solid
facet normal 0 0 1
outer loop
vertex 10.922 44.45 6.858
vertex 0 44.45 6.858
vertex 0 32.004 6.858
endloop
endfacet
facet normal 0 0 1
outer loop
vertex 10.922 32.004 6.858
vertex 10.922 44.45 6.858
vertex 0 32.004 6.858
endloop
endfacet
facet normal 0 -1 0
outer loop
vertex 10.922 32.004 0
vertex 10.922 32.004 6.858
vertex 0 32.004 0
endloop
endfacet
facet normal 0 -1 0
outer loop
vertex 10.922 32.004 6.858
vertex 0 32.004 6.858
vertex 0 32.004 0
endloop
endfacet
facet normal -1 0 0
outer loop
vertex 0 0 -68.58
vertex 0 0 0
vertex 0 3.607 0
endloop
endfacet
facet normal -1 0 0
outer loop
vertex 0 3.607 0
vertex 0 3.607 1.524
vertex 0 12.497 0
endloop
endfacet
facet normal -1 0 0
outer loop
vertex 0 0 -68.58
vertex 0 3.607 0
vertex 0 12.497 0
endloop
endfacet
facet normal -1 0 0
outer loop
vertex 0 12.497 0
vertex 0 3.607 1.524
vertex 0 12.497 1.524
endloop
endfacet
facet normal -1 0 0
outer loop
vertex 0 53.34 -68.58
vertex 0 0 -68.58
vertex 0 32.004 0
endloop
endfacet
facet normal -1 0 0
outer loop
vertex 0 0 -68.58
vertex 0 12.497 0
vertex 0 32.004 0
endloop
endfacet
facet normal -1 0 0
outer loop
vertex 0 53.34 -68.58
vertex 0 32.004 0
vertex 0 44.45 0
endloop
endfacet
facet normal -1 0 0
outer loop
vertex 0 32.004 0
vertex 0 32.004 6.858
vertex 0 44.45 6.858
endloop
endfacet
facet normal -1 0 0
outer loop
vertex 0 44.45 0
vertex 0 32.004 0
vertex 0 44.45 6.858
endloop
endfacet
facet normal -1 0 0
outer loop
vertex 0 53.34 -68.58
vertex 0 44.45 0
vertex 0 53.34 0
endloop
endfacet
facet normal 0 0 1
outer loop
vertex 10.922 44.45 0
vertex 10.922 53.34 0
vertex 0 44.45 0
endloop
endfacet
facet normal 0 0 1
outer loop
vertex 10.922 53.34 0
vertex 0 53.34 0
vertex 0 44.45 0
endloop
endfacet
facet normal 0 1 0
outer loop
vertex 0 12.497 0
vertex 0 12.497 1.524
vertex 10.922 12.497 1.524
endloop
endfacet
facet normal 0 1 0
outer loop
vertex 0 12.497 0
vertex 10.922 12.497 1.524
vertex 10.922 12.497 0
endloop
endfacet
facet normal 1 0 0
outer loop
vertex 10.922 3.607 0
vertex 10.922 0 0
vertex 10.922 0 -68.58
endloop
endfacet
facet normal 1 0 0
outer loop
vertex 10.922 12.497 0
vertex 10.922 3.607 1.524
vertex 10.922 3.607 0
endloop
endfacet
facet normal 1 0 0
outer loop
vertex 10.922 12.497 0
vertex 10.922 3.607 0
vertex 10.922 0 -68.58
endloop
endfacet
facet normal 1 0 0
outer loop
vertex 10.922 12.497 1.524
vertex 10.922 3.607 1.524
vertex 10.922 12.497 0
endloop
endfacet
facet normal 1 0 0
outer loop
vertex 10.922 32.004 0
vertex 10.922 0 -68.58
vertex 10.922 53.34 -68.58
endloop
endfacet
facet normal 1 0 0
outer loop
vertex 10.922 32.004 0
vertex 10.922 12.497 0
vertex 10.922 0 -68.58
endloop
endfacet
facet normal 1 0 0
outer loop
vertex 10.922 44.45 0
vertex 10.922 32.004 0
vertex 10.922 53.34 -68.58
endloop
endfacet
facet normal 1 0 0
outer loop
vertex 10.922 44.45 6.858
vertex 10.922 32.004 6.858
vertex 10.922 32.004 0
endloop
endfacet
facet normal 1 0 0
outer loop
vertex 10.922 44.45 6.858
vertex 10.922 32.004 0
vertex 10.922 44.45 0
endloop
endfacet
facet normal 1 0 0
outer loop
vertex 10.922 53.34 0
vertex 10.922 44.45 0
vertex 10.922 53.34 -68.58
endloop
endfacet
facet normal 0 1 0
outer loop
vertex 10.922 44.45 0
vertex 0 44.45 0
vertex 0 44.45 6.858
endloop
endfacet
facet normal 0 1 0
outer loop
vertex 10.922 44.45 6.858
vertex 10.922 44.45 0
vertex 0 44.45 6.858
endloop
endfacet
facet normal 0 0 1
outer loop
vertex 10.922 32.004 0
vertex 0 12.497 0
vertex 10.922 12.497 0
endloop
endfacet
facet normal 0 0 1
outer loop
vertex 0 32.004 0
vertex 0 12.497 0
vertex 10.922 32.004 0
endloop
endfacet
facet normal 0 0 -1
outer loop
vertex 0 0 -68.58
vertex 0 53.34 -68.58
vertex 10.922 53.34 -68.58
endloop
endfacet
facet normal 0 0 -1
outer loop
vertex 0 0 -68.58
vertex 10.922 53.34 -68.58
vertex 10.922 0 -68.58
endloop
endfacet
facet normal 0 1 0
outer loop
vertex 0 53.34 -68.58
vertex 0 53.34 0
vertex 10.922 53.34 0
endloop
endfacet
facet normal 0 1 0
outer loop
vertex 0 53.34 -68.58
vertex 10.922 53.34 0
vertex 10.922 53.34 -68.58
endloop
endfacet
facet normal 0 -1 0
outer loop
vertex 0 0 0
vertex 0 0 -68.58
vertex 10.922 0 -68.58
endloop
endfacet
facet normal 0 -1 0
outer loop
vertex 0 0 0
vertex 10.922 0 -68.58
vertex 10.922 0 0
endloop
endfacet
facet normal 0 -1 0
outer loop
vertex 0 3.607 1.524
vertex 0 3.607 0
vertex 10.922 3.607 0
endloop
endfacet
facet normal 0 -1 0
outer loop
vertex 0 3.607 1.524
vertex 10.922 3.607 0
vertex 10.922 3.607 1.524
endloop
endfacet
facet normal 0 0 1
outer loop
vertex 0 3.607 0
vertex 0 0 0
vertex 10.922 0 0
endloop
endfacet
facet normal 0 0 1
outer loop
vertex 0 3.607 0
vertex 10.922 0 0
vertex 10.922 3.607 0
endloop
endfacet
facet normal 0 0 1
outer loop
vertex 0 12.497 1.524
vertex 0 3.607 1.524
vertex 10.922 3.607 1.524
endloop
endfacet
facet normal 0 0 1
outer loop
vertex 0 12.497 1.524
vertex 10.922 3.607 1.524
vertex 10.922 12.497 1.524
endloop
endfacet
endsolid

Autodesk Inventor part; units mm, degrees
ref_plane "YZ Plane" through (0, 0, 0) normal (1, 0, 0) x (0, 1, 0)
ref_plane "XZ Plane" through (0, 0, 0) normal (0, 1, 0) x (-1, 0, 0)
ref_plane "XY Plane" through (0, 0, 0) normal (0, 0, 1) x (1, 0, 0)
sketch "Sketch1" plane through (0, 0, 0) normal (1, 0, 0) x (0, 1, 0)
  line L0 (53.34, 0) -> (53.34, -68.58)
  line L1 (53.34, -68.58) -> (0, -68.58)
  line L2 (0, -68.58) -> (0, 0)
  line L3 (53.34, 0) -> (44.45, 0)
  line L4 (44.45, 0) -> (44.45, 6.858)
  line L5 (44.45, 6.858) -> (32.004, 6.858)
  line L6 (32.004, 6.858) -> (32.004, 0)
  line L7 (44.45, 0) -> (53.34, 0)
  line L8 (0, 0) -> (3.6068, 0)
  line L9 (3.6068, 0) -> (3.6068, 1.524)
  line L10 (3.6068, 1.524) -> (12.4968, 1.524)
  line L11 (12.4968, 1.524) -> (12.4968, 0)
  line L12 (0, 0) -> (3.6068, 0)
  line L13 (12.4968, 0) -> (32.004, 0)
  dimension "d0" = 53.34
  dimension "d1" = 68.58
  dimension "d2" = 8.89
  dimension "d3" = 6.858
  dimension "d4" = 12.446
  dimension "d5" = 3.6068
  dimension "d6" = 1.524
  dimension "d7" = 8.89
extrude "Extrusion1" add sketch "Sketch1" along normal blind 10.922
properties part number "msheehan_uno_board"
